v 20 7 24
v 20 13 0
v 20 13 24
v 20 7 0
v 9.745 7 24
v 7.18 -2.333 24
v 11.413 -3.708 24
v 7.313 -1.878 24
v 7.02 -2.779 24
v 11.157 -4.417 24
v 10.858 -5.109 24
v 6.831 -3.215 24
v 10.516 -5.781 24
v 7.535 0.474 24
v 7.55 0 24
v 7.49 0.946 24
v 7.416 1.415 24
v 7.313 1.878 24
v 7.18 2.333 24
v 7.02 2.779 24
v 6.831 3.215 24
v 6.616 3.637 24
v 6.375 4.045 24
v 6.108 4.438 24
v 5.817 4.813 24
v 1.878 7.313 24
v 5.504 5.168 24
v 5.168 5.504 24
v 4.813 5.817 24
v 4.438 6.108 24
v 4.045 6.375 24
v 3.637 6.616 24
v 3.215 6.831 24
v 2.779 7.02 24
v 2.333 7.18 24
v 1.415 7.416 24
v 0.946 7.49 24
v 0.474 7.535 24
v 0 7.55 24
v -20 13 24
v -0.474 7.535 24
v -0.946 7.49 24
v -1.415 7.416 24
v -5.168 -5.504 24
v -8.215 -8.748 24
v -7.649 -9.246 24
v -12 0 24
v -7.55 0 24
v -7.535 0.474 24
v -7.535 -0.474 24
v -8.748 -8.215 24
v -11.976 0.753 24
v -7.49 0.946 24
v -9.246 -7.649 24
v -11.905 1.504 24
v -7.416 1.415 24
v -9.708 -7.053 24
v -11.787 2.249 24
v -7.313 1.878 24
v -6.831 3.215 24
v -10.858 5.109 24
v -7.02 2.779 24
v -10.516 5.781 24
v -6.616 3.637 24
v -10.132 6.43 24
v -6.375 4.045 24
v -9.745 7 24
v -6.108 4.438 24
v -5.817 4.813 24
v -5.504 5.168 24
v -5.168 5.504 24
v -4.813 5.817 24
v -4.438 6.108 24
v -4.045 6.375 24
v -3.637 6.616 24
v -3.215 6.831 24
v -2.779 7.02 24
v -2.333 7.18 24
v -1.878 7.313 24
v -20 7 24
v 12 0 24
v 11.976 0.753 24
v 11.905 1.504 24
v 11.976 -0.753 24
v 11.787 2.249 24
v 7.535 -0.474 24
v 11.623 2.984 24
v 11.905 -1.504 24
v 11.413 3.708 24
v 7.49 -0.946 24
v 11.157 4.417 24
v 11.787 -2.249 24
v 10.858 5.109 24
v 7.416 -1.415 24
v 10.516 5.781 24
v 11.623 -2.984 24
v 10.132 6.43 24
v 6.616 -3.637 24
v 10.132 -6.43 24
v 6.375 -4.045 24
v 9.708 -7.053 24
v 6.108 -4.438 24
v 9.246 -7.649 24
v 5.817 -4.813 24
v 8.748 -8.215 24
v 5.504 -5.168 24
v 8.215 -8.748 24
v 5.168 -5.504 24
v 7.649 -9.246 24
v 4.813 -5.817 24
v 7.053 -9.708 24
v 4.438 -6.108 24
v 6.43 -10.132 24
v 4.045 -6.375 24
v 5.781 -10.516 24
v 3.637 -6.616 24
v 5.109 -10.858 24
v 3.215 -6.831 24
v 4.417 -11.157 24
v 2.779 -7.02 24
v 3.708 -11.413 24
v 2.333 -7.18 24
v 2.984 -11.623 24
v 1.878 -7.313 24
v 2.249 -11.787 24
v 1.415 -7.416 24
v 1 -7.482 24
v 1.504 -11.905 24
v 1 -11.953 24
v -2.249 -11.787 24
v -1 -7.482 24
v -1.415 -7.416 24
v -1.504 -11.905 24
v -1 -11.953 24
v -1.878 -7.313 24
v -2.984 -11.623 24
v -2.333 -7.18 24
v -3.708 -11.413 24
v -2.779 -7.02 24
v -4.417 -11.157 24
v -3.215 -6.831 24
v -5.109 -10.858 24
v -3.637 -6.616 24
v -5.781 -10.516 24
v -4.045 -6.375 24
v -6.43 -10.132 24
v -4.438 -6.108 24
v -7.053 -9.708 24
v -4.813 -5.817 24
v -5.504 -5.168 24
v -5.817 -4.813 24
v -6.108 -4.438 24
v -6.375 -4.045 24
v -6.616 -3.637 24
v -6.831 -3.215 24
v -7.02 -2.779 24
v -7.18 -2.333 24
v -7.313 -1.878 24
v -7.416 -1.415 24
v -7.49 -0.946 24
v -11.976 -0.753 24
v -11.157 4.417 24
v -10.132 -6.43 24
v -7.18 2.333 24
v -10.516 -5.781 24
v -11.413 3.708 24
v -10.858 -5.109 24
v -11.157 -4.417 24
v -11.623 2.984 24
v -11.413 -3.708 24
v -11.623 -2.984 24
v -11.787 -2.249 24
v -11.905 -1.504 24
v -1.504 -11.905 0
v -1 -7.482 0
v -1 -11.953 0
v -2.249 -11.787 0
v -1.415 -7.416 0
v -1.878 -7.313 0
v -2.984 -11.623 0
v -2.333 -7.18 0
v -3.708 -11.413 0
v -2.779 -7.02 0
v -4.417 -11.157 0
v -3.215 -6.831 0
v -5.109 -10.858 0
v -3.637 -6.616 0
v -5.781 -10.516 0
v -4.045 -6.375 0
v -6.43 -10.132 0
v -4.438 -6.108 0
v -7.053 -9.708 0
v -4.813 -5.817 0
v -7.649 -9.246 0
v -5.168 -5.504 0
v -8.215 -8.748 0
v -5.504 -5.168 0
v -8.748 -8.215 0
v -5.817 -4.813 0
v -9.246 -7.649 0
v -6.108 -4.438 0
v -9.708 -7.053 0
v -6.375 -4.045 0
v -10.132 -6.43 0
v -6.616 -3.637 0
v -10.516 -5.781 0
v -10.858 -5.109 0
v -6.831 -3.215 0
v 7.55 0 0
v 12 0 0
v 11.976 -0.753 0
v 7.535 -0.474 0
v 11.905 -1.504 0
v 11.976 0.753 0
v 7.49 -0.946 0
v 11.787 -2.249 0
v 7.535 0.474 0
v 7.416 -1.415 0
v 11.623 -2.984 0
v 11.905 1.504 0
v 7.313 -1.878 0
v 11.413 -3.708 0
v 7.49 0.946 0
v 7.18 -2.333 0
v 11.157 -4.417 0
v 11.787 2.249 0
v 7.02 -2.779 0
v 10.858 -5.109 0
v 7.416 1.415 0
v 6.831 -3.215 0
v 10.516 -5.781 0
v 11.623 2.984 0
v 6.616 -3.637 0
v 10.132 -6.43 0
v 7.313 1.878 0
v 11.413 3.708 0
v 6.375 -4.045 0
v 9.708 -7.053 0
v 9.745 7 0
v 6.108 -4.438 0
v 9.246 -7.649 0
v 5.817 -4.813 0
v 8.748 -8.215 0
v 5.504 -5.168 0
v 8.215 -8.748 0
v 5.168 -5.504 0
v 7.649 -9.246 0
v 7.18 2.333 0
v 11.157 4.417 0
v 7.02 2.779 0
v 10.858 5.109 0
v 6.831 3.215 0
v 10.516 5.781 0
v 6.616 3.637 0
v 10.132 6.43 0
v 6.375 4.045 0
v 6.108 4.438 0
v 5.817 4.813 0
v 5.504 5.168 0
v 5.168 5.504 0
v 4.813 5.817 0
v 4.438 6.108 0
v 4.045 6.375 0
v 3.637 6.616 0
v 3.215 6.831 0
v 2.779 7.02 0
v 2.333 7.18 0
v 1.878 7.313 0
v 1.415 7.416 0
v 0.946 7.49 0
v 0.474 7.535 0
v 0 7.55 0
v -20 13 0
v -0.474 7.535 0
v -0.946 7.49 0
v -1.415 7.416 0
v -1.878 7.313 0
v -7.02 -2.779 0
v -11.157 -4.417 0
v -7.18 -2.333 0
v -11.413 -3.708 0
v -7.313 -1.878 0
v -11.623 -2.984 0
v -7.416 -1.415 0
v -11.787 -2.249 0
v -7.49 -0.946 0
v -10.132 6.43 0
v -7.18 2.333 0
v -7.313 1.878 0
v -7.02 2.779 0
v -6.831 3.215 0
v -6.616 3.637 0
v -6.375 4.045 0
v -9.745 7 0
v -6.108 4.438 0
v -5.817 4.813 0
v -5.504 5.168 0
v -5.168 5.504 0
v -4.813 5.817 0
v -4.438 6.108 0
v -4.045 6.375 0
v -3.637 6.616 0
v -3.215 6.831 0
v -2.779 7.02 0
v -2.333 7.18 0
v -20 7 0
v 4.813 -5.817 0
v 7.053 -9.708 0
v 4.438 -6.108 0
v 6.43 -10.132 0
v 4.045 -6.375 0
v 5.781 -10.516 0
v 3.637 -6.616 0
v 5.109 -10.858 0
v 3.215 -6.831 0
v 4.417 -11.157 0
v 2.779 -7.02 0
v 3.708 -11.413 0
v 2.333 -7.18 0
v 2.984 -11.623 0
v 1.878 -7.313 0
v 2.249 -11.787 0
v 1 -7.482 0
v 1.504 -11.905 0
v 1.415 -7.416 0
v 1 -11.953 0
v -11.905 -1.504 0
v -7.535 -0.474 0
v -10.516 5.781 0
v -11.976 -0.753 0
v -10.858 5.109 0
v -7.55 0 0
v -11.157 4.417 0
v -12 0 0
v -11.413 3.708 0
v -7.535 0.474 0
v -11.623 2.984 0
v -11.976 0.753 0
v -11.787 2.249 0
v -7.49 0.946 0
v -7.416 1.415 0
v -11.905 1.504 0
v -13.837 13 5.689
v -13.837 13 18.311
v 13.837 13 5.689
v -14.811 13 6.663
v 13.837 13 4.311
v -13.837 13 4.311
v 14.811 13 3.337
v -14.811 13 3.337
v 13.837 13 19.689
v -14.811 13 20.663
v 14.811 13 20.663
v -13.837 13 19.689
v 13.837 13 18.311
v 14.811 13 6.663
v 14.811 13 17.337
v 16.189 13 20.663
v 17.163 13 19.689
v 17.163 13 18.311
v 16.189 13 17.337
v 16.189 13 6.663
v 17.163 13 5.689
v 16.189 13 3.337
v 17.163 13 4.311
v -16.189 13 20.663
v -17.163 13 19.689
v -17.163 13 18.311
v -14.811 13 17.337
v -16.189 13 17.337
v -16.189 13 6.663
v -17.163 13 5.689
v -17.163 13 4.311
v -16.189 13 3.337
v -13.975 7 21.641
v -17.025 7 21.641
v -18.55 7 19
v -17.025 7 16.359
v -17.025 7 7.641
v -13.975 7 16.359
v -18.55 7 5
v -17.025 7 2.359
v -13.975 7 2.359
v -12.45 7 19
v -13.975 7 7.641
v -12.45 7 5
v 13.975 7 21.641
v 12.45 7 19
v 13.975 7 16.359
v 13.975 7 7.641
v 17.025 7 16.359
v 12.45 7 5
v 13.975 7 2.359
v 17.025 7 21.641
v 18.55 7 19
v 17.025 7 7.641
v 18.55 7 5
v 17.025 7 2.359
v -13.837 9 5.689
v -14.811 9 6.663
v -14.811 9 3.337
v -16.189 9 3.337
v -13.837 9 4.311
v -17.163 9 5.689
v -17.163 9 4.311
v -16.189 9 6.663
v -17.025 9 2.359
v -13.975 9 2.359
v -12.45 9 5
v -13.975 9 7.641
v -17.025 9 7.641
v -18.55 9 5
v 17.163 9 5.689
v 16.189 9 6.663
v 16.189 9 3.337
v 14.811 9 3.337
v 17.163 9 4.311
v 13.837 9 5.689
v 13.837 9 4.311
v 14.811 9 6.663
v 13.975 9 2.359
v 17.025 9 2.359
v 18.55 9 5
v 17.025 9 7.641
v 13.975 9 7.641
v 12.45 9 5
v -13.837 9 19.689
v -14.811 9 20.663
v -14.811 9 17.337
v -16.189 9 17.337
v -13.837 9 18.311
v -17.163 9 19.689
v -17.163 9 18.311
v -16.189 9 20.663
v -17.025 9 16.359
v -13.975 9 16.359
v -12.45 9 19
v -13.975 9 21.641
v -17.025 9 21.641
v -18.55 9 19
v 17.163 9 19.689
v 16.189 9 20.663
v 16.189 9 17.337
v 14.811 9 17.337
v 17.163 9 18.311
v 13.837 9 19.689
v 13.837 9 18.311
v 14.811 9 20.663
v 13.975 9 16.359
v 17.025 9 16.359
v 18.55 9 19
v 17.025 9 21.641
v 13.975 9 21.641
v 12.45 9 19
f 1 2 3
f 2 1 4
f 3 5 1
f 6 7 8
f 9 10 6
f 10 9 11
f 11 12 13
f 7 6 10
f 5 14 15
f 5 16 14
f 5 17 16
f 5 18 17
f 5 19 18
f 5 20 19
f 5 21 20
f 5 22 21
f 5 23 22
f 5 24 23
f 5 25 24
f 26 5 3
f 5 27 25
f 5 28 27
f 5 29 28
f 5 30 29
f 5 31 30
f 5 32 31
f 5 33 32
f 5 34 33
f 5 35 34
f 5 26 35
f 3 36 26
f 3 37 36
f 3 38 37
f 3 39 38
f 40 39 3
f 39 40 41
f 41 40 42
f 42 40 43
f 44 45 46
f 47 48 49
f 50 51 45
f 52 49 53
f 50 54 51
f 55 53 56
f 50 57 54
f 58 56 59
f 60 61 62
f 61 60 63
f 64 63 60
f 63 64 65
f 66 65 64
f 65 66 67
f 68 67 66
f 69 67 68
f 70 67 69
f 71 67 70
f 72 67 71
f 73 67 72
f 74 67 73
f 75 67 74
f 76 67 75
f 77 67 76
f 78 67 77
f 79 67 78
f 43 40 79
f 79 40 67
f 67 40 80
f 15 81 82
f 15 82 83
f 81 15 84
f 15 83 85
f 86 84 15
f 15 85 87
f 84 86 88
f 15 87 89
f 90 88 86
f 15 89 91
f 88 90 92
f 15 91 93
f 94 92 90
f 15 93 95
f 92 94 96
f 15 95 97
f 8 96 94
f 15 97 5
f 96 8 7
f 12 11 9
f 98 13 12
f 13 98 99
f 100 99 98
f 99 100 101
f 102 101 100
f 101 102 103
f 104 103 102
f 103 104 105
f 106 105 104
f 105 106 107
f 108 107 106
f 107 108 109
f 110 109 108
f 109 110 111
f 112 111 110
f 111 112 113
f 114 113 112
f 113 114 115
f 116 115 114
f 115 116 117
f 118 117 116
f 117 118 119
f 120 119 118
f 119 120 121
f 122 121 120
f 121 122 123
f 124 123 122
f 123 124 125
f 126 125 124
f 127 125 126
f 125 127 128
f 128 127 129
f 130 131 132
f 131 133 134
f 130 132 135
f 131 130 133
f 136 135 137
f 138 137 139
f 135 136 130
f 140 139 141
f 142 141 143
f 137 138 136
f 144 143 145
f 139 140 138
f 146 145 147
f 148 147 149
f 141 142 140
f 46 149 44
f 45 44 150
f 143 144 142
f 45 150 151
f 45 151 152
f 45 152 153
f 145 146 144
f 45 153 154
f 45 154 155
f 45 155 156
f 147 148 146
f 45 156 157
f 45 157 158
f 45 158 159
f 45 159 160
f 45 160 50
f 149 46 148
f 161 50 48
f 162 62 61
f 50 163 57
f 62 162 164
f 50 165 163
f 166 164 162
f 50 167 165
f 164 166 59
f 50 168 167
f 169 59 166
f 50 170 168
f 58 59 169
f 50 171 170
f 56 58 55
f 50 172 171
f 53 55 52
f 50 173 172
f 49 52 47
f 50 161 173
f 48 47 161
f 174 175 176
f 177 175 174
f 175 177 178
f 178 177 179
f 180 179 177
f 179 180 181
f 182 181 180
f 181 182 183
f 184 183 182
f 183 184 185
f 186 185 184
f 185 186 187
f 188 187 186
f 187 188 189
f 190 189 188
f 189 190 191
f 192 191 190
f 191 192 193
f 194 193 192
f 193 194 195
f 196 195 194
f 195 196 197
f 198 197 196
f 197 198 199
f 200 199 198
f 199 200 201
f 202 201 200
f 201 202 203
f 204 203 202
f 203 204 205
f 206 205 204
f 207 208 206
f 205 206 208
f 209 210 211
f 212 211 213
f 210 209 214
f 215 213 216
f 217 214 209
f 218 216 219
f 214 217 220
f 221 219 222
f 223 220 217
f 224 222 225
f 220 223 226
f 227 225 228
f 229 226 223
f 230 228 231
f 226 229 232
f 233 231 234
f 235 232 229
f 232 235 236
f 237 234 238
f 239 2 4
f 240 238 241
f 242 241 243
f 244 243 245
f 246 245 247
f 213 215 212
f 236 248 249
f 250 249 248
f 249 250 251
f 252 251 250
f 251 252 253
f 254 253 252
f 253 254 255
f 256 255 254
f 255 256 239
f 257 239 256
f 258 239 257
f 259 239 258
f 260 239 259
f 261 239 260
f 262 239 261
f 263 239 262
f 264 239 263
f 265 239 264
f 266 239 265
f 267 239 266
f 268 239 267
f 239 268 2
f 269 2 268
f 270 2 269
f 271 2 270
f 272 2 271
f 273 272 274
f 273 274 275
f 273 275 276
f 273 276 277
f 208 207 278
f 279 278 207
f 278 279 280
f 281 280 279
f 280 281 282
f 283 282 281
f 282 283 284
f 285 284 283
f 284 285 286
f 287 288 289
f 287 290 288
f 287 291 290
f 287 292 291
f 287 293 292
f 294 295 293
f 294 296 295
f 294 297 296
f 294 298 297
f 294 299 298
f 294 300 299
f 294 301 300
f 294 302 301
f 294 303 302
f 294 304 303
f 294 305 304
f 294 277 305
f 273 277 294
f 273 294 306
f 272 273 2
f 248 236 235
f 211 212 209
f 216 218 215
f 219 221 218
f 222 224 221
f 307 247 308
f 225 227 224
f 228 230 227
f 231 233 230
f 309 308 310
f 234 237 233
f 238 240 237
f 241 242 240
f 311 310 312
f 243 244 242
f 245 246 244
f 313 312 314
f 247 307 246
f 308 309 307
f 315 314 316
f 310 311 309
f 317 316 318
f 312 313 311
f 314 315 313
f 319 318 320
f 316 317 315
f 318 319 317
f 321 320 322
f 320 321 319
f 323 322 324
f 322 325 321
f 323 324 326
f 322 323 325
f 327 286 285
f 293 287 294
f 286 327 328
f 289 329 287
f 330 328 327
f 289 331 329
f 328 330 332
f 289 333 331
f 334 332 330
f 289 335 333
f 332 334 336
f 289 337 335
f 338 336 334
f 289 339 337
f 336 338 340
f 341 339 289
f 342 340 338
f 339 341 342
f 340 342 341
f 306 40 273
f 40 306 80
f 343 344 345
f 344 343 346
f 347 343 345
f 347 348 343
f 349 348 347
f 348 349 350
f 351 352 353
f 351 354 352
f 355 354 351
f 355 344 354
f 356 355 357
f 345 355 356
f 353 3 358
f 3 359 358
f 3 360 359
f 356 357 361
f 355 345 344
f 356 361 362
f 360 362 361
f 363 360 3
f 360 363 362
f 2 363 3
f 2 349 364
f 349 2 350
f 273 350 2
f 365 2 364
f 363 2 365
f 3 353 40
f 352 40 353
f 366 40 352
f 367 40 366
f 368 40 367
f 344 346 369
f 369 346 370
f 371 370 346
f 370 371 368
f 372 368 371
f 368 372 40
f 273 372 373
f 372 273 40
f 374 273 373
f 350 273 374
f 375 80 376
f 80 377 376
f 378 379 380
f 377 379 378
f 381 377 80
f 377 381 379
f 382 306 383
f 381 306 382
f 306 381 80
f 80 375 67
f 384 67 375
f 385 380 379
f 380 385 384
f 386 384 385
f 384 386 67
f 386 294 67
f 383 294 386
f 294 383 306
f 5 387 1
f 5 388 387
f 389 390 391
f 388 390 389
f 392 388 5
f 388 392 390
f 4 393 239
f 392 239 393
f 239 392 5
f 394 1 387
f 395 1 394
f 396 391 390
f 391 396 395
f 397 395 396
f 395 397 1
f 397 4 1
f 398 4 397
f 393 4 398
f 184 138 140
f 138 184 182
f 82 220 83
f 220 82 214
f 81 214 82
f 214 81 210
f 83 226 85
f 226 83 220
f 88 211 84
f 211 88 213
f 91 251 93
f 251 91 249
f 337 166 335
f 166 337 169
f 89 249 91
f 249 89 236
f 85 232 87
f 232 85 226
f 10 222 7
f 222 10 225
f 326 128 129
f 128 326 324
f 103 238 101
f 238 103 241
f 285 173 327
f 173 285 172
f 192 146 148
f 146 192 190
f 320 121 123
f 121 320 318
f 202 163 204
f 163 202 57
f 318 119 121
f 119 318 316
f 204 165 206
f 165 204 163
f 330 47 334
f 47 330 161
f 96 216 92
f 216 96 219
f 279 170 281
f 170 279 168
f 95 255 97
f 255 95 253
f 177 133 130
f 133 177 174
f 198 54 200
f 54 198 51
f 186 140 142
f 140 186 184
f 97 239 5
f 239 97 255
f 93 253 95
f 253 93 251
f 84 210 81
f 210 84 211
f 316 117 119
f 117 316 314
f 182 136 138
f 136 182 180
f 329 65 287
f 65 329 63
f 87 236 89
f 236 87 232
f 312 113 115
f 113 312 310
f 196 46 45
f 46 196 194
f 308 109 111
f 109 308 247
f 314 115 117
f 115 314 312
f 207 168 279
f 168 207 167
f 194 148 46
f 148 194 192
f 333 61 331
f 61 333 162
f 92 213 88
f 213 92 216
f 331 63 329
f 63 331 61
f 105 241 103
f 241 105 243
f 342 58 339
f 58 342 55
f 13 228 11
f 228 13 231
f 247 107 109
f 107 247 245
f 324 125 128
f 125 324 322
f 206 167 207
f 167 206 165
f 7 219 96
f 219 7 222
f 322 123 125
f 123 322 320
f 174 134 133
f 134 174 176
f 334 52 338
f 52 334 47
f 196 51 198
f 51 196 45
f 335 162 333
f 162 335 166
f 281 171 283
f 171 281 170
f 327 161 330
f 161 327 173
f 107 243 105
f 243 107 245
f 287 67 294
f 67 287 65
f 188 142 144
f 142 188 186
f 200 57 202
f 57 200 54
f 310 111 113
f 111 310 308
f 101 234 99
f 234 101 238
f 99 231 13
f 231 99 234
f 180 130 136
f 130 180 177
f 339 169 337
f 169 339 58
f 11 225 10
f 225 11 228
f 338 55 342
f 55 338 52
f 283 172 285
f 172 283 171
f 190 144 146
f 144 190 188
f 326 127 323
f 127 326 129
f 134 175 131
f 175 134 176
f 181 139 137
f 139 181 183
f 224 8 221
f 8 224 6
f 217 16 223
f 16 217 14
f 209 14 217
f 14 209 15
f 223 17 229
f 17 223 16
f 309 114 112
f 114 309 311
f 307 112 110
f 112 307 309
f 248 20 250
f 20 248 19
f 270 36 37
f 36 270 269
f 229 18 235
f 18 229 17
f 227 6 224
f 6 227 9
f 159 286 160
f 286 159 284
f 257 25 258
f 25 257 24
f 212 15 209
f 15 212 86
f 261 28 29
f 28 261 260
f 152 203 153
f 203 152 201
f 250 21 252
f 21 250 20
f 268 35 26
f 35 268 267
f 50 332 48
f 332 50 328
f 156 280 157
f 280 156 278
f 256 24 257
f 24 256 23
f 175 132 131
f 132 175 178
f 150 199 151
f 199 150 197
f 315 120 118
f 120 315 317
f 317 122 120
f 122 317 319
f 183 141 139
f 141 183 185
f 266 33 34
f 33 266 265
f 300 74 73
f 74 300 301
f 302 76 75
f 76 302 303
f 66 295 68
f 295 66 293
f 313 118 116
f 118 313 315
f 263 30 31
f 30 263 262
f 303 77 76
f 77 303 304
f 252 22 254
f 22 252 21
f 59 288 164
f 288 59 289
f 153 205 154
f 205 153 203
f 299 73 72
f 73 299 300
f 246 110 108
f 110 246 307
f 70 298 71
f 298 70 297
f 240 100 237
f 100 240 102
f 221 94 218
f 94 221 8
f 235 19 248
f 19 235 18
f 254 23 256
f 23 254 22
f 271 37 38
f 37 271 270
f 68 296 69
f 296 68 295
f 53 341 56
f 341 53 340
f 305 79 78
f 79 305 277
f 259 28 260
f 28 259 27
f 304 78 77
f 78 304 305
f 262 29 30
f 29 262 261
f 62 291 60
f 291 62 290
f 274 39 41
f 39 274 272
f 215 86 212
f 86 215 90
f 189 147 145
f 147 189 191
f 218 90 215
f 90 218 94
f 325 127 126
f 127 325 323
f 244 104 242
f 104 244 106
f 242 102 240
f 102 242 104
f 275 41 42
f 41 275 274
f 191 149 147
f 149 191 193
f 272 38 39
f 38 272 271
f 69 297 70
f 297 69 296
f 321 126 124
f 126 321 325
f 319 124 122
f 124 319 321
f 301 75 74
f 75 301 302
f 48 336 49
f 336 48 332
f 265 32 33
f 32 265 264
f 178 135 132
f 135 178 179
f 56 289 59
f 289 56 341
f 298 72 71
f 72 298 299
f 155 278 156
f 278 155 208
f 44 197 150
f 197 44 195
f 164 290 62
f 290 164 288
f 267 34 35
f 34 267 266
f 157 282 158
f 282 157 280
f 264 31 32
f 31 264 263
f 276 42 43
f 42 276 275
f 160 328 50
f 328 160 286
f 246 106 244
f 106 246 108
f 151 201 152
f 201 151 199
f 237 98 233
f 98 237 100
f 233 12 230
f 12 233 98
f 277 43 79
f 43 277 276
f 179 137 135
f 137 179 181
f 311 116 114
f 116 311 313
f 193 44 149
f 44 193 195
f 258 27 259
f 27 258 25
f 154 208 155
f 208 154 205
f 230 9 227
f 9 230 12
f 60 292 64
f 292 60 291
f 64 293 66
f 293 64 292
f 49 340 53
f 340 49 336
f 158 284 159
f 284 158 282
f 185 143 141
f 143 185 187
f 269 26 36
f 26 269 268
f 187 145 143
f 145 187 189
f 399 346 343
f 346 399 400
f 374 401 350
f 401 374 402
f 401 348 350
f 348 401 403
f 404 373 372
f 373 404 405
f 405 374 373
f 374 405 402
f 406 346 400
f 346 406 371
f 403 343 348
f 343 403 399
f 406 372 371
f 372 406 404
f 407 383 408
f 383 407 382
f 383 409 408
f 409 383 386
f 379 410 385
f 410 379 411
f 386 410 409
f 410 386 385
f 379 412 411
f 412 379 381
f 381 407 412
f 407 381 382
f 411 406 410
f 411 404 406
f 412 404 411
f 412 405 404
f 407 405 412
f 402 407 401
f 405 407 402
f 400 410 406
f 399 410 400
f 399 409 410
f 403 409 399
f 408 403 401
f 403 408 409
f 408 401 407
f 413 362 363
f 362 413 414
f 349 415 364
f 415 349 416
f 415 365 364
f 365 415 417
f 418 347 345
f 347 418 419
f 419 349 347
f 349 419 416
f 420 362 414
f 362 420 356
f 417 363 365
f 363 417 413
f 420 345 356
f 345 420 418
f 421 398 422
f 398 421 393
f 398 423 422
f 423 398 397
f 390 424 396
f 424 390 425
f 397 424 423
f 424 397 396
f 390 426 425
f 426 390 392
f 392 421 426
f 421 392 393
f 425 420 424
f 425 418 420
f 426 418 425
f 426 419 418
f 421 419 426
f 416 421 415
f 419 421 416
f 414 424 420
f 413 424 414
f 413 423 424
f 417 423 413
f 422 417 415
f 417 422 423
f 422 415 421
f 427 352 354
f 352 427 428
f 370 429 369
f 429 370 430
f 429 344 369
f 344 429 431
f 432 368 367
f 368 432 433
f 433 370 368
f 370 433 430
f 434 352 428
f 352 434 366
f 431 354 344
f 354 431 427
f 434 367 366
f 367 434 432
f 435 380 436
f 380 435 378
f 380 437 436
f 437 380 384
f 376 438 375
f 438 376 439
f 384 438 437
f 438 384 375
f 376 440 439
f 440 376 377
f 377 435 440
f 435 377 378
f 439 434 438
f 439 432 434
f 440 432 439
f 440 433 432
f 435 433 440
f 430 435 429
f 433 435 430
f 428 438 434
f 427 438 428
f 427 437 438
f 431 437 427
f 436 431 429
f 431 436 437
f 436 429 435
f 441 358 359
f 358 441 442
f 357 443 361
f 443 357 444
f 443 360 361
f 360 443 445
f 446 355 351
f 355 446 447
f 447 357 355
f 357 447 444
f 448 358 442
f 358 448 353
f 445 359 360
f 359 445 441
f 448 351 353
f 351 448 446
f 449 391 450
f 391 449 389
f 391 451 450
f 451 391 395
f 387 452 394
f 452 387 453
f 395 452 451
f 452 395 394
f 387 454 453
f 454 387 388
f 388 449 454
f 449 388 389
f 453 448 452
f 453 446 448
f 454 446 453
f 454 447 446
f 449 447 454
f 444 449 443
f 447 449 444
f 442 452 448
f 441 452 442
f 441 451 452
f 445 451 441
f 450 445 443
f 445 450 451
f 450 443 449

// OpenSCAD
// file: functions.scad
// PRUSA Mendel  
// Functions used in many files
// GNU GPL v2
// Josef Průša
// josefprusa@me.com
// prusadjs.cz
// http://www.reprap.org/wiki/Prusa_Mendel
// http://github.com/prusajr/PrusaMendel

module nut( d, h, horizontal = true )
{
	cornerdiameter = ( d / 2 ) / cos( 180 / 6 );
	cylinder( h = h, r = cornerdiameter, $fn = 6 );
	if( horizontal )
	{
		for( i = [1 : 6] )
		{
			rotate( [0, 0, 60 * i] ) translate( [-cornerdiameter - 0.2, 0, 0] ) rotate( [0, 0, -45] ) cube( size = [2, 2, h] );
		}
	}
}

// By nophead
module polyhole( d, h ) 
{
	n = max( round( 2 * d ), 3 );
	rotate( [0, 0, 180] ) cylinder( h = h, r = ( d / 2 ) / cos( 180 / n ), $fn = n );
}

module roundcorner( diameter )
{
	difference()
	{
		cube( size = [diameter, diameter, 99], center = false );
		translate( v = [diameter, diameter, 0] ) cylinder( h = 100, r = diameter, center = true );
	}
}
// file: metric.scad
// PRUSA Mendel  
// Default metric sizes
// GNU GPL v2
// Josef Průša
// josefprusa@me.com
// prusadjs.cz
// http://www.reprap.org/wiki/Prusa_Mendel
// http://github.com/prusajr/PrusaMendel

// DONT CHANGE THIS FILE! ALTER VALUES IN CONFIGURATION.SCAD INSTEAD

// RODS

threaded_rod_diameter = 8.2;
threaded_rod_diameter_horizontal = 8.2;
smooth_bar_diameter = 8;
smooth_bar_diameter_horizontal = 8.5;

// Nuts and bolts

m8_diameter = 9;
m8_nut_diameter = 16.4;

m4_diameter = 4.5;
m4_nut_diameter = 9;

m3_diameter = 3.6;
m3_nut_diameter = 6.1;

// Bushing holder

bushing_core_diameter = smooth_bar_diameter;
bushing_material_thickness = 1;

// Motors

motor_shaft = 5.5;
// file: configuration.scad
// PRUSA Mendel  
// Configuration file
// GNU GPL v2
// Josef Průša
// josefprusa@me.com
// prusadjs.cz
// http://www.reprap.org/wiki/Prusa_Mendel
// http://github.com/prusajr/PrusaMendel

// PLEASE SELECT ONE OF THE CONFIGURATIONS BELOW
// BY UN-COMMENTING IT

// Uncomment for metric settings
// METRIC METRIC METRIC METRIC METRIC METRIC METRIC METRIC 

include <metric.scad>;

// Uncomment for imperial settings
// IMPERIAL IMPERIAL IMPERIAL IMPERIAL IMPERIAL IMPERIAL IMPERIAL 

//include <sae.scad>;

// CUSTOM CUSTOM CUSTOM CUSTOM CUSTOM CUSTOM CUSTOM CUSTOM CUSTOM

// Thin walls
layer_height = 0.3;
wot = 1.5;
filament_width = layer_height * wot;

thin_wall = 4 * layer_height * wot;

// LM8UU
linear = true;
linear_bearing_diameter = 15;
linear_bearing_length = 24;

//608 bearing
bearing_diameter = 22;
bearing_thickness = 7;

//Timing belt
belt_pitch = 5;

// CHANGE ONLY THE STUFF YOU KNOW
// IT WILL REPLACE DEFAULT SETTING

// RODS

// threaded_rod_diameter = 0;
// threaded_rod_diameter_horizontal = 0;
// smooth_bar_díameter = 0;
// smooth_bar_díameter_horizontal = 0;

// Nuts and bolts

// m8_diameter = 0;
// m8_nut_diameter = 0;
// m8_nut_thickness = 0;

// m4_diameter = 0;
 m4_nut_diameter = 8.5;
// m4_nut_thickness = 0;

// m3_diameter = 0;
// m3_nut_diameter = 0;
m3_nut_thickness = 3;

// Bushing holder

// bushing_core_diameter = smooth_bar_díameter;
// bushing_material_thickness = 0;

///counted stuff
m3_nut_diameter_bigger = ( ( m3_nut_diameter  / 2) / cos( 180 / 6 ) ) * 2;

// functions 
include <functions.scad>
// main file
include <configuration.scad>

 y_lm8uu();

module hex_hole()
{
	rotate( [90, 22.5, 0] ) cylinder( h = 8, r = m3_diameter / 2, $fn = 8 ); // M3 hole
	rotate( [90, 0, 0] ) translate( [0, 0, 5] ) cylinder( h = 3, r = m3_nut_diameter / 2, $fn = 6) ; // M3 hex 
}

module block()
{
	difference()
	{
		union()
		{
			translate( [0, 10, 12] ) cube( [40, 6, 24], center = true );
			cylinder( 24, r = 12, $fn = 100 );
		}

		union()
		{
			translate( [-1, -13, -1] ) cube( [2, 14, 26] ); 
			translate( [0, 0, -1] ) cylinder( 26, r = 6, $fn = 100 );
			translate( [0, 0, -1] ) cylinder( 26, r = 7.55, $fn = 100 ); // COMMENT OUT FOR END STOP
//			translate( [0, 0, 2] ) cylinder( 26, r = 7.55, $fn = 100 ); // UNCOMMENT FOR END STOP
		}
	}
}

module y_lm8uu()
{
	difference()
	{
		block();

		translate ( [-15.5,14,5] ) hex_hole();
		translate ( [15.5, 14, 5] ) hex_hole();
		translate ( [-15.5, 14, 19] ) hex_hole();
		translate ( [15.5, 14, 19] ) hex_hole();
	}
}
